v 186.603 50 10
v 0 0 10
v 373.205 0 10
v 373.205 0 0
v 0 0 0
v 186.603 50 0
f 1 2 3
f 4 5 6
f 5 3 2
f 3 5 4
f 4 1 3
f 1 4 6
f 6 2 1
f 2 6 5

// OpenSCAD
angle = 98.46095072889200849886037758551538;
angle = 150;


length = 50;
height = 10;
fix=1;

echo(2*(length/cos(angle/2))*sin(angle/2));
width=2*(length/cos(angle/2))*sin(angle/2);

difference()
{
	cube([width,length,height]);
	
	#translate([width/2,50,-fix/2])
	rotate(270+angle/2, [0,0,1])
	cube([length/cos(angle/2),length*sin(angle/2),height + fix]);

	#translate([width/2,50,-fix/2])
	rotate(180-angle/2, [0,0,1])
	cube([length*sin(angle/2),length/cos(angle/2),height + fix]);

}
